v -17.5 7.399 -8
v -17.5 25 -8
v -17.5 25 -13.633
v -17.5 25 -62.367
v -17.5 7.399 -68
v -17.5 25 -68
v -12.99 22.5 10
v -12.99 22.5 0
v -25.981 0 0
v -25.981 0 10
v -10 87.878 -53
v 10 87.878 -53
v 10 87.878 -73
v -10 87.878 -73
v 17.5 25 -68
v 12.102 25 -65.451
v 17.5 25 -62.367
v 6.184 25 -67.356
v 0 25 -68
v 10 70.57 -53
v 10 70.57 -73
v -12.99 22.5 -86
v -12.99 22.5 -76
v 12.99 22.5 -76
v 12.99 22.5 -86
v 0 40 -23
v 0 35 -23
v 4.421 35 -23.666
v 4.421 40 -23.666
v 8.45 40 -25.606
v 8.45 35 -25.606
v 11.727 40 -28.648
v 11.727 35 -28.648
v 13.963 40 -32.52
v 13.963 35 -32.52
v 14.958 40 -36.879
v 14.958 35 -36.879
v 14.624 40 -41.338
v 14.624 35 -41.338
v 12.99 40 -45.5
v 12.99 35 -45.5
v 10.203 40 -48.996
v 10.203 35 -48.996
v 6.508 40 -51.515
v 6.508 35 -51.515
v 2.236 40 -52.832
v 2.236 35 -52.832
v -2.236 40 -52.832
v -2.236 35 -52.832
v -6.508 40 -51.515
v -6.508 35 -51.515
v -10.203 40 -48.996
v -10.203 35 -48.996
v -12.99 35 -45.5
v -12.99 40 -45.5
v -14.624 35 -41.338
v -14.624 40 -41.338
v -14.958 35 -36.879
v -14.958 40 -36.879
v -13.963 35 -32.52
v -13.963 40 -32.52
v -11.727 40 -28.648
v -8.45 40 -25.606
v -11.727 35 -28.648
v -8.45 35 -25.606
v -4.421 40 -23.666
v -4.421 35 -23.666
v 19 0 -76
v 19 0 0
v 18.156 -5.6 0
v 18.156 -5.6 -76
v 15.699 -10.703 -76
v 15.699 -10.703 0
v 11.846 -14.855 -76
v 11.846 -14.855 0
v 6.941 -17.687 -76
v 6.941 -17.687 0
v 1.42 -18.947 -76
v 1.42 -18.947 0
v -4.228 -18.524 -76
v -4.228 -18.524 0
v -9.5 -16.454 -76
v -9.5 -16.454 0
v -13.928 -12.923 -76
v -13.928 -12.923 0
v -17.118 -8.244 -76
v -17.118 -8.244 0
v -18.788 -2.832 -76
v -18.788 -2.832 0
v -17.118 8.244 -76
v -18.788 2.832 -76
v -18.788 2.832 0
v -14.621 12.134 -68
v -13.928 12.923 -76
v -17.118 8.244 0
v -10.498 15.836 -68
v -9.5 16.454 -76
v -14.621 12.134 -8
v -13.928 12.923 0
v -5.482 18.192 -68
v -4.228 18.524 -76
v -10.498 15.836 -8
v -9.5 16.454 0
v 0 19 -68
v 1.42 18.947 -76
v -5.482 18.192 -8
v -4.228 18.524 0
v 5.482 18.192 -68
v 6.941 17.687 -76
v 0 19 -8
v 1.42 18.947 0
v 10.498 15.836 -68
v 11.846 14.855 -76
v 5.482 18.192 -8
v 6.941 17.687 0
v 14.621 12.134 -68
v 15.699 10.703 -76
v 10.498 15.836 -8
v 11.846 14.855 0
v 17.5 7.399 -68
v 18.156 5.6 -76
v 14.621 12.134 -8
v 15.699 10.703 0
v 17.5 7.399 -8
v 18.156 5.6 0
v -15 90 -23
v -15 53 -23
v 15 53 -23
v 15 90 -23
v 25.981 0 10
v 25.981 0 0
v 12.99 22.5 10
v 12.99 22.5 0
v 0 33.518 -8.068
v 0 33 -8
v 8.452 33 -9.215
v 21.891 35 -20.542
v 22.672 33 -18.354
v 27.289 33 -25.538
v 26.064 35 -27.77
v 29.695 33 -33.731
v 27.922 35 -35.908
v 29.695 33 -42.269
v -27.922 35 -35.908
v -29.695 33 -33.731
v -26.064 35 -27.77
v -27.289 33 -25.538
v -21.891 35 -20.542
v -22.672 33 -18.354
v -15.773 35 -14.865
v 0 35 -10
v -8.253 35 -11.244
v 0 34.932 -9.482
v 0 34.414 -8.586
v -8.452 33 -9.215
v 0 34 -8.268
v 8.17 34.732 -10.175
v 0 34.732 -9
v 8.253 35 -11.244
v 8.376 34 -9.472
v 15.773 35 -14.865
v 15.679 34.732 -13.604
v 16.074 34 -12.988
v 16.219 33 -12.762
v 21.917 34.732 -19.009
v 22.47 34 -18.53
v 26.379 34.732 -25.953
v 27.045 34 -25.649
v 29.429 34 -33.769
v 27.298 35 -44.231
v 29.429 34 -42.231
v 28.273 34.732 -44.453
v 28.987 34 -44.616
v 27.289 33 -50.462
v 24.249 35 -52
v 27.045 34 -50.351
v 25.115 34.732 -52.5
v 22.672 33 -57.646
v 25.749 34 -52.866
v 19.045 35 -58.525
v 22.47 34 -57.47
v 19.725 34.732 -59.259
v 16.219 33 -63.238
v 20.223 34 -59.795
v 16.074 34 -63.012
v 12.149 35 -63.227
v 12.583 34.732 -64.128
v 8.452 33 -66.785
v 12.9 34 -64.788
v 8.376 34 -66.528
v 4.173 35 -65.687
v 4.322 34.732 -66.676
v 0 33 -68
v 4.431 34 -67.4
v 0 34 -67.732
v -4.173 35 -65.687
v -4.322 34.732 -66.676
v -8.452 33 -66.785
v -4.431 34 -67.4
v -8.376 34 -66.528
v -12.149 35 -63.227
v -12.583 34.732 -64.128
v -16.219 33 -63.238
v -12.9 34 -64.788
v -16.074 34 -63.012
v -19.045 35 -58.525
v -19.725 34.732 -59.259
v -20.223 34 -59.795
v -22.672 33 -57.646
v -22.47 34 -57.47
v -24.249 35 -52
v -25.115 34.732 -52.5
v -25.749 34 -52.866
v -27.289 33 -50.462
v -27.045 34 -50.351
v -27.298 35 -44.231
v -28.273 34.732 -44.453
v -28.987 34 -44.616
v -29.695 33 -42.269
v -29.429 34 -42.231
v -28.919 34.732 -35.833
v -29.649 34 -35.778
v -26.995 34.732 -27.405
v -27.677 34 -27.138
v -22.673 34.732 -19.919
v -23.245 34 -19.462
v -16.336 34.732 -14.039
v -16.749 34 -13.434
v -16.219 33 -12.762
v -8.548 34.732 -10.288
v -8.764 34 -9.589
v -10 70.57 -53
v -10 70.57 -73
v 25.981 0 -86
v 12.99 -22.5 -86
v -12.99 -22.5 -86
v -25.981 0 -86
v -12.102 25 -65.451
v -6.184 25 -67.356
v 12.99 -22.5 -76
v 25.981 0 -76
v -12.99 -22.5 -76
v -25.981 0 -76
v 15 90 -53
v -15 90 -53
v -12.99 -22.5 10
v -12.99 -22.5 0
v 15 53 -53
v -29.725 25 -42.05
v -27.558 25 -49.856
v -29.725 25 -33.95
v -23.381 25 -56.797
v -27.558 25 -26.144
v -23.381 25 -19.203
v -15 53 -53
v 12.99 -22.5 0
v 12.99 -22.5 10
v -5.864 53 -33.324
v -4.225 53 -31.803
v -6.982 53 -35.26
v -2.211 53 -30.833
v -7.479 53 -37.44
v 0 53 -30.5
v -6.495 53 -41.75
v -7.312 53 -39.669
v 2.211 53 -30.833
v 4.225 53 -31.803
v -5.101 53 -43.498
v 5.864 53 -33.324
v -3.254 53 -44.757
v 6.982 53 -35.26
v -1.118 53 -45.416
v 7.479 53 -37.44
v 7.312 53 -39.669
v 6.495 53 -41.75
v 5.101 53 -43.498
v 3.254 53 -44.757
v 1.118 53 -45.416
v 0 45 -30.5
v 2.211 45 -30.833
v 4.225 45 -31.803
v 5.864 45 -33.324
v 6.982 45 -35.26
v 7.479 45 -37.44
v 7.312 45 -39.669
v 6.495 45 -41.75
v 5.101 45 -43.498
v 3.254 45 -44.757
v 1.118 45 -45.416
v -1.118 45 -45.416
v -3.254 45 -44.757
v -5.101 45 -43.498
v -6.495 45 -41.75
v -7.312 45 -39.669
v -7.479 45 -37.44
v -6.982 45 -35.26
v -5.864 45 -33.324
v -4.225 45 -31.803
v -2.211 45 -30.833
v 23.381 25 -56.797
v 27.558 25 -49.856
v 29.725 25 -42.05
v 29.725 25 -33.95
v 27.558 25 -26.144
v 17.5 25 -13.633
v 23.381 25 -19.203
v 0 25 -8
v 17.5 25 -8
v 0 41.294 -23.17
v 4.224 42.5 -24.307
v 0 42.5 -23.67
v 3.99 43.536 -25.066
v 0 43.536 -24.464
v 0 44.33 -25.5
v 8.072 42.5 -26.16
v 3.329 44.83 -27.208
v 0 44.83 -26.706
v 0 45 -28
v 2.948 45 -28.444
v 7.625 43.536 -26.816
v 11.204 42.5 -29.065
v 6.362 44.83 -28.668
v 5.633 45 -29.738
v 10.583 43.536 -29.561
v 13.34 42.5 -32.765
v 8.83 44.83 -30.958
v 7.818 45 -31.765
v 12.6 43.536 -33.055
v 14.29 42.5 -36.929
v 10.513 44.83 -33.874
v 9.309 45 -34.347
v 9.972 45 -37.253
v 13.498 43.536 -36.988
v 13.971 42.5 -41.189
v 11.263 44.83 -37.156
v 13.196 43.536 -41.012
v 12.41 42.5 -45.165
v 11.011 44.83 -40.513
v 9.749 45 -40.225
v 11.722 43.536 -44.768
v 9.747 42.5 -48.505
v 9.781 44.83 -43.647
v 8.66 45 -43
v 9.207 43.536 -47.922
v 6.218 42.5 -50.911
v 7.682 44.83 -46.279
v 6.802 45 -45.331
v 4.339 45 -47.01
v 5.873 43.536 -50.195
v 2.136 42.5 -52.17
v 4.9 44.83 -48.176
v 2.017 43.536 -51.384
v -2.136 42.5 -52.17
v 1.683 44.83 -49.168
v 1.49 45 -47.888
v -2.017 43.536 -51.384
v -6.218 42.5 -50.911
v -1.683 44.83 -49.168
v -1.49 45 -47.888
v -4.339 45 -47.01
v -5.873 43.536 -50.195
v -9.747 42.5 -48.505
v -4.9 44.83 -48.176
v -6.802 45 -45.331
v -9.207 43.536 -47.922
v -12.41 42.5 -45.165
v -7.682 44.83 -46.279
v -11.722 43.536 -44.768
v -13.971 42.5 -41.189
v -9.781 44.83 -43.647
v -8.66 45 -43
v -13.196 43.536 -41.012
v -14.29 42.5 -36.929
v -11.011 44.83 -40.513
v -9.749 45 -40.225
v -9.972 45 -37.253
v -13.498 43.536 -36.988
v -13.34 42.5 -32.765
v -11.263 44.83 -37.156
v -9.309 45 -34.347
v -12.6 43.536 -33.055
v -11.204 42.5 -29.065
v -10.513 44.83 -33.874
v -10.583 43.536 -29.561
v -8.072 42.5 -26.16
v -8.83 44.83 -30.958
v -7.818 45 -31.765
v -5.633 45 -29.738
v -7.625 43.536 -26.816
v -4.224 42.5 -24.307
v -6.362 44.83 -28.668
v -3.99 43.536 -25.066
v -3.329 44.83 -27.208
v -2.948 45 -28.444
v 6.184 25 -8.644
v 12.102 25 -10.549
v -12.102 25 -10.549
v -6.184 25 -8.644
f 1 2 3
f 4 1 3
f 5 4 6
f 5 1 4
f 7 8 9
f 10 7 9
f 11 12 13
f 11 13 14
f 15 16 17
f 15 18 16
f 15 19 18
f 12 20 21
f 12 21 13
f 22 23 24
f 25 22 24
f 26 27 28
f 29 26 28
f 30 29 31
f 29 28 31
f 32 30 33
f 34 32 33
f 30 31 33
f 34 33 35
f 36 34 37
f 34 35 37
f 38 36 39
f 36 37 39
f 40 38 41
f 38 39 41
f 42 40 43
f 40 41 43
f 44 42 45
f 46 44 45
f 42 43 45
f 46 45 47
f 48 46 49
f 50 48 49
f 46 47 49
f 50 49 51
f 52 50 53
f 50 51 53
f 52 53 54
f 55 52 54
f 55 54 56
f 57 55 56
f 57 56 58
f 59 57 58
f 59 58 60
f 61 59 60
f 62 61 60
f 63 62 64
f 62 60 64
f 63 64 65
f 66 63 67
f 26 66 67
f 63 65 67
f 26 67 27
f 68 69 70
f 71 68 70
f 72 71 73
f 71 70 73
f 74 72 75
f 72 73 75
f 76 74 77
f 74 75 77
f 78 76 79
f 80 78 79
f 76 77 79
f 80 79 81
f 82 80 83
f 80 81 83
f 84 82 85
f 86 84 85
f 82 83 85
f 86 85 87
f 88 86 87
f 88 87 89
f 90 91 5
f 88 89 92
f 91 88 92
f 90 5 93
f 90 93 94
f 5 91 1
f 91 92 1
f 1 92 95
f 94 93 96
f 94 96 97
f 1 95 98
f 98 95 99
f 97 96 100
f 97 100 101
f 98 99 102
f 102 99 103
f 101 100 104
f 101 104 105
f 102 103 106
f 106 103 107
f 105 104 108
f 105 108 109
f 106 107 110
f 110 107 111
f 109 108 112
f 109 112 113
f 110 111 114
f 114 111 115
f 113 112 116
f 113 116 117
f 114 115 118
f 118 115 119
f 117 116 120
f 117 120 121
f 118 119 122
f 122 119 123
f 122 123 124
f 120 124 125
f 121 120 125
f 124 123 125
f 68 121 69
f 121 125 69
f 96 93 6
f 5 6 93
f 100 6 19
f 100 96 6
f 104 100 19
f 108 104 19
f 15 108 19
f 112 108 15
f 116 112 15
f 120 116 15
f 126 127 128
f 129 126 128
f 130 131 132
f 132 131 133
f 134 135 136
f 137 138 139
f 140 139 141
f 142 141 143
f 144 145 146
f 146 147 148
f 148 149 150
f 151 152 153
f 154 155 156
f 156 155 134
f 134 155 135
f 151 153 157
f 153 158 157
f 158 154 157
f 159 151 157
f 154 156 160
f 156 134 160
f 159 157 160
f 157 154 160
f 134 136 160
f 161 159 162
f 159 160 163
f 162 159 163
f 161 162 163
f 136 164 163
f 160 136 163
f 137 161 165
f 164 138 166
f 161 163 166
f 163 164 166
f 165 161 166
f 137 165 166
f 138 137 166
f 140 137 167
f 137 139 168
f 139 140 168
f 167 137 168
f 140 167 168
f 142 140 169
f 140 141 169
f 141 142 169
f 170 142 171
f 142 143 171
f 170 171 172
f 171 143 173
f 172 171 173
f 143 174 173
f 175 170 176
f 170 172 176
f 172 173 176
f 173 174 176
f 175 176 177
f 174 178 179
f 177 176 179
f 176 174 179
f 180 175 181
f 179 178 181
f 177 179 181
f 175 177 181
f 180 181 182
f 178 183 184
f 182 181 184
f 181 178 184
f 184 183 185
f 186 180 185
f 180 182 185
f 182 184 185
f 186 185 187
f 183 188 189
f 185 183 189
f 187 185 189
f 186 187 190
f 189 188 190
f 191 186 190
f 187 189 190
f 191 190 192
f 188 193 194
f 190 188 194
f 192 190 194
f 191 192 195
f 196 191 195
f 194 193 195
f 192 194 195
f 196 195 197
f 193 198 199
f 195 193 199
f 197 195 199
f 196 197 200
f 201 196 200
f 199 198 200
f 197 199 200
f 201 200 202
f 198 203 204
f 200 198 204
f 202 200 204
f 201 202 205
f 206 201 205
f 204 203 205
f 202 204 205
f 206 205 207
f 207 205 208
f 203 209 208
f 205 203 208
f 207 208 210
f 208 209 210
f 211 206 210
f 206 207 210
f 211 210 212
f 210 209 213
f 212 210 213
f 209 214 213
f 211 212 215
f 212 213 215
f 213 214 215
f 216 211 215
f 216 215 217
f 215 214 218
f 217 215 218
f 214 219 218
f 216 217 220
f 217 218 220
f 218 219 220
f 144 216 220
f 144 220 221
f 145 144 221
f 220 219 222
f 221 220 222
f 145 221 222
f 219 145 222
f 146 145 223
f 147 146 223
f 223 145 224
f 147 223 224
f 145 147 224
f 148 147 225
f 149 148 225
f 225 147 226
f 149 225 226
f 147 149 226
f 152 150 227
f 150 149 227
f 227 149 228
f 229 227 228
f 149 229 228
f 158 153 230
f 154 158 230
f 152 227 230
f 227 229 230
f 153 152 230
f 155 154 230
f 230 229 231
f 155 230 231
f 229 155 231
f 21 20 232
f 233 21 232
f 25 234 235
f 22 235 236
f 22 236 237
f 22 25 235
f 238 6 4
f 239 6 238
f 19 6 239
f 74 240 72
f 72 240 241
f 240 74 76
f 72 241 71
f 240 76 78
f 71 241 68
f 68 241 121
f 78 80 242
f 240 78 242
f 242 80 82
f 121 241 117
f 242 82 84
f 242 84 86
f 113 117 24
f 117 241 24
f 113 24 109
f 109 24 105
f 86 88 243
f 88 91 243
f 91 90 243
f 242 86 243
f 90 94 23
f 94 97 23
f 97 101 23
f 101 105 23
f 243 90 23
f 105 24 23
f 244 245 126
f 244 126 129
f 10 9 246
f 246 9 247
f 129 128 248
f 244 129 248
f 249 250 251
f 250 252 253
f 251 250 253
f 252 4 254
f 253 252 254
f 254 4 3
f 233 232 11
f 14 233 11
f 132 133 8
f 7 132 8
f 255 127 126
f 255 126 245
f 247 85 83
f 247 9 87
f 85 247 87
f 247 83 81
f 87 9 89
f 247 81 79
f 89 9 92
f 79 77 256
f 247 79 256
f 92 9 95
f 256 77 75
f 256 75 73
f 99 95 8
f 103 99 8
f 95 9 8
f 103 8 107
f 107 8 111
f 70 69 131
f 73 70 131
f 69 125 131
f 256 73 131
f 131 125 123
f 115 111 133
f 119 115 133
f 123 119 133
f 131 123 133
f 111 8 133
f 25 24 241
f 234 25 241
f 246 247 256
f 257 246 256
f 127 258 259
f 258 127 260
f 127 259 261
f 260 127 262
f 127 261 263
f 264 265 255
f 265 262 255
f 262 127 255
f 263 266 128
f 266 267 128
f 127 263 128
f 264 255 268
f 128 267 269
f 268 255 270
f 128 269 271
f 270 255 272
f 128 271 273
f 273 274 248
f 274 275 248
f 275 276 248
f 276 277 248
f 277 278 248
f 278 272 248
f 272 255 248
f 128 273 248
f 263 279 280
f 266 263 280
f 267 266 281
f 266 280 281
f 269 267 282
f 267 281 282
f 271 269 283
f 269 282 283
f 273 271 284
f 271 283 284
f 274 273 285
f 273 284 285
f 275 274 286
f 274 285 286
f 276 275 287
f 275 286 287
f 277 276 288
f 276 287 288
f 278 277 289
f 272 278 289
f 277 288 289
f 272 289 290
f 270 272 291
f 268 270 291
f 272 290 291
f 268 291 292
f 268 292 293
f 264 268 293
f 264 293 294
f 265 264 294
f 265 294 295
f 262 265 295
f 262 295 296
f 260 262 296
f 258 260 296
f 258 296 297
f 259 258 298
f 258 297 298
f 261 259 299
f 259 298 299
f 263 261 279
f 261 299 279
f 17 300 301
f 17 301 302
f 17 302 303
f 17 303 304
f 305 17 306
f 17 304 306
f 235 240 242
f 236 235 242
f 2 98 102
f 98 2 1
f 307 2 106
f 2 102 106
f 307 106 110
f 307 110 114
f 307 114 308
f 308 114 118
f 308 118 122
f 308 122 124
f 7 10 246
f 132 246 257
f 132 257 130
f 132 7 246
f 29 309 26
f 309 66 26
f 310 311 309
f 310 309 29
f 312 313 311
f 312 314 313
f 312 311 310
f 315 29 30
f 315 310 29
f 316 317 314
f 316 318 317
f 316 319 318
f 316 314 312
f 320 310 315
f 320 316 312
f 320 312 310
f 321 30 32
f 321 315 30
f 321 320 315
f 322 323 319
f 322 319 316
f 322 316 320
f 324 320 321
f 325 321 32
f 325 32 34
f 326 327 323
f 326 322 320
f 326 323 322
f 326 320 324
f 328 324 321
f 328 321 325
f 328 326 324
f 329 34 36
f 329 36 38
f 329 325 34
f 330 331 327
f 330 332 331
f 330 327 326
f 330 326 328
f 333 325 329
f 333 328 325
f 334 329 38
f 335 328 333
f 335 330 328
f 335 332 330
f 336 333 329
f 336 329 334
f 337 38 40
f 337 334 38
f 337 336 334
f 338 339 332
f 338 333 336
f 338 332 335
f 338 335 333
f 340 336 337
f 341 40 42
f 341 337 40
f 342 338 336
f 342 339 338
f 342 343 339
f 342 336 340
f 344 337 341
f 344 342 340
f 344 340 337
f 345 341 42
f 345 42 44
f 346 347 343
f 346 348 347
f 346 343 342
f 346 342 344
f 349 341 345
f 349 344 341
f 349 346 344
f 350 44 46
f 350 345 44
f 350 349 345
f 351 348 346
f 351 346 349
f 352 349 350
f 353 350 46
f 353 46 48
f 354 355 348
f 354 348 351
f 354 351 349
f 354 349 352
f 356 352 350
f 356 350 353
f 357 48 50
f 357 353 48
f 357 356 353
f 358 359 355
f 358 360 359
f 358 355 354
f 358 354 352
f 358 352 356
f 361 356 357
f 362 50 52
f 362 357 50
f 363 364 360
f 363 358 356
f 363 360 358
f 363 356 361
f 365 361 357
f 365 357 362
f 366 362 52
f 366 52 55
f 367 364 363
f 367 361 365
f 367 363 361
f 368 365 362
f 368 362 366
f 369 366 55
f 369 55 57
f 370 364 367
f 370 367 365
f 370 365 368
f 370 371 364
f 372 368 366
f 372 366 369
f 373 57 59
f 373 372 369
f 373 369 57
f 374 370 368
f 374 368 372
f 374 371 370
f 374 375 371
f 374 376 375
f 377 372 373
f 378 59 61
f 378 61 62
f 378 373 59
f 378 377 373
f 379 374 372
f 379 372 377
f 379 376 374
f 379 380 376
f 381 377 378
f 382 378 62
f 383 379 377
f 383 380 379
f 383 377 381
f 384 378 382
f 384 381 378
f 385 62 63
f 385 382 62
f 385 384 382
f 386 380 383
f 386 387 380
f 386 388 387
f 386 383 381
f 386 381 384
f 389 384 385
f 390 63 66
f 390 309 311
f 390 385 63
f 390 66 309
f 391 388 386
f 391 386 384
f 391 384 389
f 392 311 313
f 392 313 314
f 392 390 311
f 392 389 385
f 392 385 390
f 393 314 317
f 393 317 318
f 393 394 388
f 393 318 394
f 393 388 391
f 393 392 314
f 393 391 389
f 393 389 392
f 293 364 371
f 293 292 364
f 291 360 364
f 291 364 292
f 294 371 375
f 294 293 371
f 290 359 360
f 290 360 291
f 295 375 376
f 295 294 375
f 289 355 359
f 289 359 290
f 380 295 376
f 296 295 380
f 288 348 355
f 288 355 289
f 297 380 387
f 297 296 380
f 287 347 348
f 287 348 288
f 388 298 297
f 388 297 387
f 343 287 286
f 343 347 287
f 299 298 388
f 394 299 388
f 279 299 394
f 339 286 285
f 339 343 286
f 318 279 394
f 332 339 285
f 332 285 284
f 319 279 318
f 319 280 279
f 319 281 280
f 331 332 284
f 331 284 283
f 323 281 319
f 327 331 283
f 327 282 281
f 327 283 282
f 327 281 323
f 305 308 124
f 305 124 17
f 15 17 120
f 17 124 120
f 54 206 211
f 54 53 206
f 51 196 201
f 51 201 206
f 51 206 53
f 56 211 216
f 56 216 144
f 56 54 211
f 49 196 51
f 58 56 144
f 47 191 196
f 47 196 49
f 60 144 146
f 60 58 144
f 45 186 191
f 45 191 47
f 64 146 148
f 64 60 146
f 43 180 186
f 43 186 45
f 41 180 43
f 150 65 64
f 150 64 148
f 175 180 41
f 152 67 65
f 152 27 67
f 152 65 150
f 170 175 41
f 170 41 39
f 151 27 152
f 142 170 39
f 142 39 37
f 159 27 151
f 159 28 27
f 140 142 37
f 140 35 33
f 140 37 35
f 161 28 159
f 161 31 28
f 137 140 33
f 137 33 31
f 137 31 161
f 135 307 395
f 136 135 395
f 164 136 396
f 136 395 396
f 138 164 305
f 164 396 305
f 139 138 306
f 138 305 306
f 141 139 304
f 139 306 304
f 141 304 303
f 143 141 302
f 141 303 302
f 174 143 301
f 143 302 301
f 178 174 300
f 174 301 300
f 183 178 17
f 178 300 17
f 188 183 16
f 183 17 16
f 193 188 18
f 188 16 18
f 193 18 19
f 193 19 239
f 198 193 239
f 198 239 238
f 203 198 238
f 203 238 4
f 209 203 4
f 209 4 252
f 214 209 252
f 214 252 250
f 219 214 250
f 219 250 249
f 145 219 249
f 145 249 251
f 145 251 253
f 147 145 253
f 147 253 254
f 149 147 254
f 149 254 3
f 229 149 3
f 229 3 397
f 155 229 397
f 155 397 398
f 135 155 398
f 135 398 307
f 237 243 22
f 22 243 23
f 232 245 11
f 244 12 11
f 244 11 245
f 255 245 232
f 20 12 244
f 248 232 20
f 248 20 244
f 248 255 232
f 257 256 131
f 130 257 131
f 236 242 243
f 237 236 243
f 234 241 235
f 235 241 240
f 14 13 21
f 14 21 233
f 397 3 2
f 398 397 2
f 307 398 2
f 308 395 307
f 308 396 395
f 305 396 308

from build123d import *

# Parameters (mm, degrees)
EXTRUDE_1_DEPTH   = 10
SKETCH_2_R        = 19
EXTRUDE_2_DEPTH   = 76
EXTRUDE_3_DEPTH   = 10
SKETCH_4_W        = 35
SKETCH_4_H        = 60
EXTRUDE_4_DEPTH   = 25
SKETCH_5_R        = 30
EXTRUDE_9_DEPTH   = 10
SKETCH_6_R        = 15
EXTRUDE_10_DEPTH  = 10
FILLET_1_R        = 5
SKETCH_7_R        = 7.5
EXTRUDE_11_DEPTH  = 8
SKETCH_8_W        = 30
SKETCH_8_H        = 30
EXTRUDE_12_DEPTH  = 37
FILLET_4_R        = 2
SKETCH_9_W        = 20
SKETCH_9_H        = 17.308382811
EXTRUDE_1_2_DEPTH = 20


with BuildPart() as part:
    # Эскиз1 → Extrude 1 (new body)
    with BuildSketch(Plane.XY):
        Polygon((-25.980762114, 0), (-12.990381057, -22.5), (12.990381057, -22.5), (25.980762114, 0), (12.990381057, 22.5), (-12.990381057, 22.5), align=None)
    extrude(amount=EXTRUDE_1_DEPTH)

    # Эскиз2 → Вытянуть2 (add)
    with BuildSketch(Plane(origin=(0, 0, 0), x_dir=(-1, 0, 0), z_dir=(0, 0, -1))):
        Circle(SKETCH_2_R)
    extrude(amount=EXTRUDE_2_DEPTH)

    # Эскиз3 → Вытянуть3 (add)
    with BuildSketch(Plane(origin=(0, 0, -76), x_dir=(-1, 0, 0), z_dir=(0, 0, -1))):
        Polygon((25.980762114, 0), (12.990381057, 22.5), (-12.990381057, 22.5), (-25.980762114, 0), (-12.990381057, -22.5), (12.990381057, -22.5), align=None)
    extrude(amount=EXTRUDE_3_DEPTH)

    # Эскиз4 → Вытянуть4 (add)
    with BuildSketch(Plane(origin=(0, 0, 0), x_dir=(1, 0, 0), z_dir=(0, 1, 0))):
        with Locations((0, 38)):
            Rectangle(SKETCH_4_W, SKETCH_4_H)
    extrude(amount=EXTRUDE_4_DEPTH)

    # Эскиз5 → Вытянуть9 (add)
    with BuildSketch(Plane(origin=(0, 25, 0), x_dir=(1, 0, 0), z_dir=(0, 1, 0))):
        with Locations((0, 38)):
            Circle(SKETCH_5_R)
    extrude(amount=EXTRUDE_9_DEPTH)

    # Эскиз6 → Вытянуть10 (add)
    with BuildSketch(Plane(origin=(0, 35, 0), x_dir=(1, 0, 0), z_dir=(0, 1, 0))):
        with Locations((0, 38)):
            Circle(SKETCH_6_R)
    extrude(amount=EXTRUDE_10_DEPTH)

    # Скругление1
    fillet_1_edges = [part.edges().sort_by_distance(p)[0] for p in [
        (-15, 45, -38),
    ]]
    fillet(fillet_1_edges, radius=FILLET_1_R)

    # Эскиз7 → Вытянуть11 (add)
    with BuildSketch(Plane(origin=(0, 45, 0), x_dir=(1, 0, 0), z_dir=(0, 1, 0))):
        with Locations((0, 38)):
            Circle(SKETCH_7_R)
    extrude(amount=EXTRUDE_11_DEPTH)

    # Эскиз8 → Вытянуть12 (add)
    with BuildSketch(Plane(origin=(0, 53, 0), x_dir=(1, 0, 0), z_dir=(0, 1, 0))):
        with Locations((0, 38)):
            Rectangle(SKETCH_8_W, SKETCH_8_H)
    extrude(amount=EXTRUDE_12_DEPTH)

    # Скругление4
    fillet_4_edges = [part.edges().sort_by_distance(p)[0] for p in [
        (-30, 35, -38),
    ]]
    fillet(fillet_4_edges, radius=FILLET_4_R)

    # Эскиз9 → Extrude 1 2 (add)
    with BuildSketch(Plane(origin=(0, 0, -53), x_dir=(-1, 0, 0), z_dir=(0, 0, -1))):
        with Locations((0, 79.224035867)):
            Rectangle(SKETCH_9_W, SKETCH_9_H)
    extrude(amount=EXTRUDE_1_2_DEPTH)


solid = part.part
